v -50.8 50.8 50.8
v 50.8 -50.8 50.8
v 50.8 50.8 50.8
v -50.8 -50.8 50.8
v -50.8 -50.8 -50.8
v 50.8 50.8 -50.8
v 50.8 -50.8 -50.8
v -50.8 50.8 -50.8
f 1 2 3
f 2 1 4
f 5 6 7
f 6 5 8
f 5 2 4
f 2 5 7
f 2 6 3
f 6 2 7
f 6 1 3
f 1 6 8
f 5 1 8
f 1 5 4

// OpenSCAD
side = 101.6; // 4 inches
cube([side, side, side],center=true);
